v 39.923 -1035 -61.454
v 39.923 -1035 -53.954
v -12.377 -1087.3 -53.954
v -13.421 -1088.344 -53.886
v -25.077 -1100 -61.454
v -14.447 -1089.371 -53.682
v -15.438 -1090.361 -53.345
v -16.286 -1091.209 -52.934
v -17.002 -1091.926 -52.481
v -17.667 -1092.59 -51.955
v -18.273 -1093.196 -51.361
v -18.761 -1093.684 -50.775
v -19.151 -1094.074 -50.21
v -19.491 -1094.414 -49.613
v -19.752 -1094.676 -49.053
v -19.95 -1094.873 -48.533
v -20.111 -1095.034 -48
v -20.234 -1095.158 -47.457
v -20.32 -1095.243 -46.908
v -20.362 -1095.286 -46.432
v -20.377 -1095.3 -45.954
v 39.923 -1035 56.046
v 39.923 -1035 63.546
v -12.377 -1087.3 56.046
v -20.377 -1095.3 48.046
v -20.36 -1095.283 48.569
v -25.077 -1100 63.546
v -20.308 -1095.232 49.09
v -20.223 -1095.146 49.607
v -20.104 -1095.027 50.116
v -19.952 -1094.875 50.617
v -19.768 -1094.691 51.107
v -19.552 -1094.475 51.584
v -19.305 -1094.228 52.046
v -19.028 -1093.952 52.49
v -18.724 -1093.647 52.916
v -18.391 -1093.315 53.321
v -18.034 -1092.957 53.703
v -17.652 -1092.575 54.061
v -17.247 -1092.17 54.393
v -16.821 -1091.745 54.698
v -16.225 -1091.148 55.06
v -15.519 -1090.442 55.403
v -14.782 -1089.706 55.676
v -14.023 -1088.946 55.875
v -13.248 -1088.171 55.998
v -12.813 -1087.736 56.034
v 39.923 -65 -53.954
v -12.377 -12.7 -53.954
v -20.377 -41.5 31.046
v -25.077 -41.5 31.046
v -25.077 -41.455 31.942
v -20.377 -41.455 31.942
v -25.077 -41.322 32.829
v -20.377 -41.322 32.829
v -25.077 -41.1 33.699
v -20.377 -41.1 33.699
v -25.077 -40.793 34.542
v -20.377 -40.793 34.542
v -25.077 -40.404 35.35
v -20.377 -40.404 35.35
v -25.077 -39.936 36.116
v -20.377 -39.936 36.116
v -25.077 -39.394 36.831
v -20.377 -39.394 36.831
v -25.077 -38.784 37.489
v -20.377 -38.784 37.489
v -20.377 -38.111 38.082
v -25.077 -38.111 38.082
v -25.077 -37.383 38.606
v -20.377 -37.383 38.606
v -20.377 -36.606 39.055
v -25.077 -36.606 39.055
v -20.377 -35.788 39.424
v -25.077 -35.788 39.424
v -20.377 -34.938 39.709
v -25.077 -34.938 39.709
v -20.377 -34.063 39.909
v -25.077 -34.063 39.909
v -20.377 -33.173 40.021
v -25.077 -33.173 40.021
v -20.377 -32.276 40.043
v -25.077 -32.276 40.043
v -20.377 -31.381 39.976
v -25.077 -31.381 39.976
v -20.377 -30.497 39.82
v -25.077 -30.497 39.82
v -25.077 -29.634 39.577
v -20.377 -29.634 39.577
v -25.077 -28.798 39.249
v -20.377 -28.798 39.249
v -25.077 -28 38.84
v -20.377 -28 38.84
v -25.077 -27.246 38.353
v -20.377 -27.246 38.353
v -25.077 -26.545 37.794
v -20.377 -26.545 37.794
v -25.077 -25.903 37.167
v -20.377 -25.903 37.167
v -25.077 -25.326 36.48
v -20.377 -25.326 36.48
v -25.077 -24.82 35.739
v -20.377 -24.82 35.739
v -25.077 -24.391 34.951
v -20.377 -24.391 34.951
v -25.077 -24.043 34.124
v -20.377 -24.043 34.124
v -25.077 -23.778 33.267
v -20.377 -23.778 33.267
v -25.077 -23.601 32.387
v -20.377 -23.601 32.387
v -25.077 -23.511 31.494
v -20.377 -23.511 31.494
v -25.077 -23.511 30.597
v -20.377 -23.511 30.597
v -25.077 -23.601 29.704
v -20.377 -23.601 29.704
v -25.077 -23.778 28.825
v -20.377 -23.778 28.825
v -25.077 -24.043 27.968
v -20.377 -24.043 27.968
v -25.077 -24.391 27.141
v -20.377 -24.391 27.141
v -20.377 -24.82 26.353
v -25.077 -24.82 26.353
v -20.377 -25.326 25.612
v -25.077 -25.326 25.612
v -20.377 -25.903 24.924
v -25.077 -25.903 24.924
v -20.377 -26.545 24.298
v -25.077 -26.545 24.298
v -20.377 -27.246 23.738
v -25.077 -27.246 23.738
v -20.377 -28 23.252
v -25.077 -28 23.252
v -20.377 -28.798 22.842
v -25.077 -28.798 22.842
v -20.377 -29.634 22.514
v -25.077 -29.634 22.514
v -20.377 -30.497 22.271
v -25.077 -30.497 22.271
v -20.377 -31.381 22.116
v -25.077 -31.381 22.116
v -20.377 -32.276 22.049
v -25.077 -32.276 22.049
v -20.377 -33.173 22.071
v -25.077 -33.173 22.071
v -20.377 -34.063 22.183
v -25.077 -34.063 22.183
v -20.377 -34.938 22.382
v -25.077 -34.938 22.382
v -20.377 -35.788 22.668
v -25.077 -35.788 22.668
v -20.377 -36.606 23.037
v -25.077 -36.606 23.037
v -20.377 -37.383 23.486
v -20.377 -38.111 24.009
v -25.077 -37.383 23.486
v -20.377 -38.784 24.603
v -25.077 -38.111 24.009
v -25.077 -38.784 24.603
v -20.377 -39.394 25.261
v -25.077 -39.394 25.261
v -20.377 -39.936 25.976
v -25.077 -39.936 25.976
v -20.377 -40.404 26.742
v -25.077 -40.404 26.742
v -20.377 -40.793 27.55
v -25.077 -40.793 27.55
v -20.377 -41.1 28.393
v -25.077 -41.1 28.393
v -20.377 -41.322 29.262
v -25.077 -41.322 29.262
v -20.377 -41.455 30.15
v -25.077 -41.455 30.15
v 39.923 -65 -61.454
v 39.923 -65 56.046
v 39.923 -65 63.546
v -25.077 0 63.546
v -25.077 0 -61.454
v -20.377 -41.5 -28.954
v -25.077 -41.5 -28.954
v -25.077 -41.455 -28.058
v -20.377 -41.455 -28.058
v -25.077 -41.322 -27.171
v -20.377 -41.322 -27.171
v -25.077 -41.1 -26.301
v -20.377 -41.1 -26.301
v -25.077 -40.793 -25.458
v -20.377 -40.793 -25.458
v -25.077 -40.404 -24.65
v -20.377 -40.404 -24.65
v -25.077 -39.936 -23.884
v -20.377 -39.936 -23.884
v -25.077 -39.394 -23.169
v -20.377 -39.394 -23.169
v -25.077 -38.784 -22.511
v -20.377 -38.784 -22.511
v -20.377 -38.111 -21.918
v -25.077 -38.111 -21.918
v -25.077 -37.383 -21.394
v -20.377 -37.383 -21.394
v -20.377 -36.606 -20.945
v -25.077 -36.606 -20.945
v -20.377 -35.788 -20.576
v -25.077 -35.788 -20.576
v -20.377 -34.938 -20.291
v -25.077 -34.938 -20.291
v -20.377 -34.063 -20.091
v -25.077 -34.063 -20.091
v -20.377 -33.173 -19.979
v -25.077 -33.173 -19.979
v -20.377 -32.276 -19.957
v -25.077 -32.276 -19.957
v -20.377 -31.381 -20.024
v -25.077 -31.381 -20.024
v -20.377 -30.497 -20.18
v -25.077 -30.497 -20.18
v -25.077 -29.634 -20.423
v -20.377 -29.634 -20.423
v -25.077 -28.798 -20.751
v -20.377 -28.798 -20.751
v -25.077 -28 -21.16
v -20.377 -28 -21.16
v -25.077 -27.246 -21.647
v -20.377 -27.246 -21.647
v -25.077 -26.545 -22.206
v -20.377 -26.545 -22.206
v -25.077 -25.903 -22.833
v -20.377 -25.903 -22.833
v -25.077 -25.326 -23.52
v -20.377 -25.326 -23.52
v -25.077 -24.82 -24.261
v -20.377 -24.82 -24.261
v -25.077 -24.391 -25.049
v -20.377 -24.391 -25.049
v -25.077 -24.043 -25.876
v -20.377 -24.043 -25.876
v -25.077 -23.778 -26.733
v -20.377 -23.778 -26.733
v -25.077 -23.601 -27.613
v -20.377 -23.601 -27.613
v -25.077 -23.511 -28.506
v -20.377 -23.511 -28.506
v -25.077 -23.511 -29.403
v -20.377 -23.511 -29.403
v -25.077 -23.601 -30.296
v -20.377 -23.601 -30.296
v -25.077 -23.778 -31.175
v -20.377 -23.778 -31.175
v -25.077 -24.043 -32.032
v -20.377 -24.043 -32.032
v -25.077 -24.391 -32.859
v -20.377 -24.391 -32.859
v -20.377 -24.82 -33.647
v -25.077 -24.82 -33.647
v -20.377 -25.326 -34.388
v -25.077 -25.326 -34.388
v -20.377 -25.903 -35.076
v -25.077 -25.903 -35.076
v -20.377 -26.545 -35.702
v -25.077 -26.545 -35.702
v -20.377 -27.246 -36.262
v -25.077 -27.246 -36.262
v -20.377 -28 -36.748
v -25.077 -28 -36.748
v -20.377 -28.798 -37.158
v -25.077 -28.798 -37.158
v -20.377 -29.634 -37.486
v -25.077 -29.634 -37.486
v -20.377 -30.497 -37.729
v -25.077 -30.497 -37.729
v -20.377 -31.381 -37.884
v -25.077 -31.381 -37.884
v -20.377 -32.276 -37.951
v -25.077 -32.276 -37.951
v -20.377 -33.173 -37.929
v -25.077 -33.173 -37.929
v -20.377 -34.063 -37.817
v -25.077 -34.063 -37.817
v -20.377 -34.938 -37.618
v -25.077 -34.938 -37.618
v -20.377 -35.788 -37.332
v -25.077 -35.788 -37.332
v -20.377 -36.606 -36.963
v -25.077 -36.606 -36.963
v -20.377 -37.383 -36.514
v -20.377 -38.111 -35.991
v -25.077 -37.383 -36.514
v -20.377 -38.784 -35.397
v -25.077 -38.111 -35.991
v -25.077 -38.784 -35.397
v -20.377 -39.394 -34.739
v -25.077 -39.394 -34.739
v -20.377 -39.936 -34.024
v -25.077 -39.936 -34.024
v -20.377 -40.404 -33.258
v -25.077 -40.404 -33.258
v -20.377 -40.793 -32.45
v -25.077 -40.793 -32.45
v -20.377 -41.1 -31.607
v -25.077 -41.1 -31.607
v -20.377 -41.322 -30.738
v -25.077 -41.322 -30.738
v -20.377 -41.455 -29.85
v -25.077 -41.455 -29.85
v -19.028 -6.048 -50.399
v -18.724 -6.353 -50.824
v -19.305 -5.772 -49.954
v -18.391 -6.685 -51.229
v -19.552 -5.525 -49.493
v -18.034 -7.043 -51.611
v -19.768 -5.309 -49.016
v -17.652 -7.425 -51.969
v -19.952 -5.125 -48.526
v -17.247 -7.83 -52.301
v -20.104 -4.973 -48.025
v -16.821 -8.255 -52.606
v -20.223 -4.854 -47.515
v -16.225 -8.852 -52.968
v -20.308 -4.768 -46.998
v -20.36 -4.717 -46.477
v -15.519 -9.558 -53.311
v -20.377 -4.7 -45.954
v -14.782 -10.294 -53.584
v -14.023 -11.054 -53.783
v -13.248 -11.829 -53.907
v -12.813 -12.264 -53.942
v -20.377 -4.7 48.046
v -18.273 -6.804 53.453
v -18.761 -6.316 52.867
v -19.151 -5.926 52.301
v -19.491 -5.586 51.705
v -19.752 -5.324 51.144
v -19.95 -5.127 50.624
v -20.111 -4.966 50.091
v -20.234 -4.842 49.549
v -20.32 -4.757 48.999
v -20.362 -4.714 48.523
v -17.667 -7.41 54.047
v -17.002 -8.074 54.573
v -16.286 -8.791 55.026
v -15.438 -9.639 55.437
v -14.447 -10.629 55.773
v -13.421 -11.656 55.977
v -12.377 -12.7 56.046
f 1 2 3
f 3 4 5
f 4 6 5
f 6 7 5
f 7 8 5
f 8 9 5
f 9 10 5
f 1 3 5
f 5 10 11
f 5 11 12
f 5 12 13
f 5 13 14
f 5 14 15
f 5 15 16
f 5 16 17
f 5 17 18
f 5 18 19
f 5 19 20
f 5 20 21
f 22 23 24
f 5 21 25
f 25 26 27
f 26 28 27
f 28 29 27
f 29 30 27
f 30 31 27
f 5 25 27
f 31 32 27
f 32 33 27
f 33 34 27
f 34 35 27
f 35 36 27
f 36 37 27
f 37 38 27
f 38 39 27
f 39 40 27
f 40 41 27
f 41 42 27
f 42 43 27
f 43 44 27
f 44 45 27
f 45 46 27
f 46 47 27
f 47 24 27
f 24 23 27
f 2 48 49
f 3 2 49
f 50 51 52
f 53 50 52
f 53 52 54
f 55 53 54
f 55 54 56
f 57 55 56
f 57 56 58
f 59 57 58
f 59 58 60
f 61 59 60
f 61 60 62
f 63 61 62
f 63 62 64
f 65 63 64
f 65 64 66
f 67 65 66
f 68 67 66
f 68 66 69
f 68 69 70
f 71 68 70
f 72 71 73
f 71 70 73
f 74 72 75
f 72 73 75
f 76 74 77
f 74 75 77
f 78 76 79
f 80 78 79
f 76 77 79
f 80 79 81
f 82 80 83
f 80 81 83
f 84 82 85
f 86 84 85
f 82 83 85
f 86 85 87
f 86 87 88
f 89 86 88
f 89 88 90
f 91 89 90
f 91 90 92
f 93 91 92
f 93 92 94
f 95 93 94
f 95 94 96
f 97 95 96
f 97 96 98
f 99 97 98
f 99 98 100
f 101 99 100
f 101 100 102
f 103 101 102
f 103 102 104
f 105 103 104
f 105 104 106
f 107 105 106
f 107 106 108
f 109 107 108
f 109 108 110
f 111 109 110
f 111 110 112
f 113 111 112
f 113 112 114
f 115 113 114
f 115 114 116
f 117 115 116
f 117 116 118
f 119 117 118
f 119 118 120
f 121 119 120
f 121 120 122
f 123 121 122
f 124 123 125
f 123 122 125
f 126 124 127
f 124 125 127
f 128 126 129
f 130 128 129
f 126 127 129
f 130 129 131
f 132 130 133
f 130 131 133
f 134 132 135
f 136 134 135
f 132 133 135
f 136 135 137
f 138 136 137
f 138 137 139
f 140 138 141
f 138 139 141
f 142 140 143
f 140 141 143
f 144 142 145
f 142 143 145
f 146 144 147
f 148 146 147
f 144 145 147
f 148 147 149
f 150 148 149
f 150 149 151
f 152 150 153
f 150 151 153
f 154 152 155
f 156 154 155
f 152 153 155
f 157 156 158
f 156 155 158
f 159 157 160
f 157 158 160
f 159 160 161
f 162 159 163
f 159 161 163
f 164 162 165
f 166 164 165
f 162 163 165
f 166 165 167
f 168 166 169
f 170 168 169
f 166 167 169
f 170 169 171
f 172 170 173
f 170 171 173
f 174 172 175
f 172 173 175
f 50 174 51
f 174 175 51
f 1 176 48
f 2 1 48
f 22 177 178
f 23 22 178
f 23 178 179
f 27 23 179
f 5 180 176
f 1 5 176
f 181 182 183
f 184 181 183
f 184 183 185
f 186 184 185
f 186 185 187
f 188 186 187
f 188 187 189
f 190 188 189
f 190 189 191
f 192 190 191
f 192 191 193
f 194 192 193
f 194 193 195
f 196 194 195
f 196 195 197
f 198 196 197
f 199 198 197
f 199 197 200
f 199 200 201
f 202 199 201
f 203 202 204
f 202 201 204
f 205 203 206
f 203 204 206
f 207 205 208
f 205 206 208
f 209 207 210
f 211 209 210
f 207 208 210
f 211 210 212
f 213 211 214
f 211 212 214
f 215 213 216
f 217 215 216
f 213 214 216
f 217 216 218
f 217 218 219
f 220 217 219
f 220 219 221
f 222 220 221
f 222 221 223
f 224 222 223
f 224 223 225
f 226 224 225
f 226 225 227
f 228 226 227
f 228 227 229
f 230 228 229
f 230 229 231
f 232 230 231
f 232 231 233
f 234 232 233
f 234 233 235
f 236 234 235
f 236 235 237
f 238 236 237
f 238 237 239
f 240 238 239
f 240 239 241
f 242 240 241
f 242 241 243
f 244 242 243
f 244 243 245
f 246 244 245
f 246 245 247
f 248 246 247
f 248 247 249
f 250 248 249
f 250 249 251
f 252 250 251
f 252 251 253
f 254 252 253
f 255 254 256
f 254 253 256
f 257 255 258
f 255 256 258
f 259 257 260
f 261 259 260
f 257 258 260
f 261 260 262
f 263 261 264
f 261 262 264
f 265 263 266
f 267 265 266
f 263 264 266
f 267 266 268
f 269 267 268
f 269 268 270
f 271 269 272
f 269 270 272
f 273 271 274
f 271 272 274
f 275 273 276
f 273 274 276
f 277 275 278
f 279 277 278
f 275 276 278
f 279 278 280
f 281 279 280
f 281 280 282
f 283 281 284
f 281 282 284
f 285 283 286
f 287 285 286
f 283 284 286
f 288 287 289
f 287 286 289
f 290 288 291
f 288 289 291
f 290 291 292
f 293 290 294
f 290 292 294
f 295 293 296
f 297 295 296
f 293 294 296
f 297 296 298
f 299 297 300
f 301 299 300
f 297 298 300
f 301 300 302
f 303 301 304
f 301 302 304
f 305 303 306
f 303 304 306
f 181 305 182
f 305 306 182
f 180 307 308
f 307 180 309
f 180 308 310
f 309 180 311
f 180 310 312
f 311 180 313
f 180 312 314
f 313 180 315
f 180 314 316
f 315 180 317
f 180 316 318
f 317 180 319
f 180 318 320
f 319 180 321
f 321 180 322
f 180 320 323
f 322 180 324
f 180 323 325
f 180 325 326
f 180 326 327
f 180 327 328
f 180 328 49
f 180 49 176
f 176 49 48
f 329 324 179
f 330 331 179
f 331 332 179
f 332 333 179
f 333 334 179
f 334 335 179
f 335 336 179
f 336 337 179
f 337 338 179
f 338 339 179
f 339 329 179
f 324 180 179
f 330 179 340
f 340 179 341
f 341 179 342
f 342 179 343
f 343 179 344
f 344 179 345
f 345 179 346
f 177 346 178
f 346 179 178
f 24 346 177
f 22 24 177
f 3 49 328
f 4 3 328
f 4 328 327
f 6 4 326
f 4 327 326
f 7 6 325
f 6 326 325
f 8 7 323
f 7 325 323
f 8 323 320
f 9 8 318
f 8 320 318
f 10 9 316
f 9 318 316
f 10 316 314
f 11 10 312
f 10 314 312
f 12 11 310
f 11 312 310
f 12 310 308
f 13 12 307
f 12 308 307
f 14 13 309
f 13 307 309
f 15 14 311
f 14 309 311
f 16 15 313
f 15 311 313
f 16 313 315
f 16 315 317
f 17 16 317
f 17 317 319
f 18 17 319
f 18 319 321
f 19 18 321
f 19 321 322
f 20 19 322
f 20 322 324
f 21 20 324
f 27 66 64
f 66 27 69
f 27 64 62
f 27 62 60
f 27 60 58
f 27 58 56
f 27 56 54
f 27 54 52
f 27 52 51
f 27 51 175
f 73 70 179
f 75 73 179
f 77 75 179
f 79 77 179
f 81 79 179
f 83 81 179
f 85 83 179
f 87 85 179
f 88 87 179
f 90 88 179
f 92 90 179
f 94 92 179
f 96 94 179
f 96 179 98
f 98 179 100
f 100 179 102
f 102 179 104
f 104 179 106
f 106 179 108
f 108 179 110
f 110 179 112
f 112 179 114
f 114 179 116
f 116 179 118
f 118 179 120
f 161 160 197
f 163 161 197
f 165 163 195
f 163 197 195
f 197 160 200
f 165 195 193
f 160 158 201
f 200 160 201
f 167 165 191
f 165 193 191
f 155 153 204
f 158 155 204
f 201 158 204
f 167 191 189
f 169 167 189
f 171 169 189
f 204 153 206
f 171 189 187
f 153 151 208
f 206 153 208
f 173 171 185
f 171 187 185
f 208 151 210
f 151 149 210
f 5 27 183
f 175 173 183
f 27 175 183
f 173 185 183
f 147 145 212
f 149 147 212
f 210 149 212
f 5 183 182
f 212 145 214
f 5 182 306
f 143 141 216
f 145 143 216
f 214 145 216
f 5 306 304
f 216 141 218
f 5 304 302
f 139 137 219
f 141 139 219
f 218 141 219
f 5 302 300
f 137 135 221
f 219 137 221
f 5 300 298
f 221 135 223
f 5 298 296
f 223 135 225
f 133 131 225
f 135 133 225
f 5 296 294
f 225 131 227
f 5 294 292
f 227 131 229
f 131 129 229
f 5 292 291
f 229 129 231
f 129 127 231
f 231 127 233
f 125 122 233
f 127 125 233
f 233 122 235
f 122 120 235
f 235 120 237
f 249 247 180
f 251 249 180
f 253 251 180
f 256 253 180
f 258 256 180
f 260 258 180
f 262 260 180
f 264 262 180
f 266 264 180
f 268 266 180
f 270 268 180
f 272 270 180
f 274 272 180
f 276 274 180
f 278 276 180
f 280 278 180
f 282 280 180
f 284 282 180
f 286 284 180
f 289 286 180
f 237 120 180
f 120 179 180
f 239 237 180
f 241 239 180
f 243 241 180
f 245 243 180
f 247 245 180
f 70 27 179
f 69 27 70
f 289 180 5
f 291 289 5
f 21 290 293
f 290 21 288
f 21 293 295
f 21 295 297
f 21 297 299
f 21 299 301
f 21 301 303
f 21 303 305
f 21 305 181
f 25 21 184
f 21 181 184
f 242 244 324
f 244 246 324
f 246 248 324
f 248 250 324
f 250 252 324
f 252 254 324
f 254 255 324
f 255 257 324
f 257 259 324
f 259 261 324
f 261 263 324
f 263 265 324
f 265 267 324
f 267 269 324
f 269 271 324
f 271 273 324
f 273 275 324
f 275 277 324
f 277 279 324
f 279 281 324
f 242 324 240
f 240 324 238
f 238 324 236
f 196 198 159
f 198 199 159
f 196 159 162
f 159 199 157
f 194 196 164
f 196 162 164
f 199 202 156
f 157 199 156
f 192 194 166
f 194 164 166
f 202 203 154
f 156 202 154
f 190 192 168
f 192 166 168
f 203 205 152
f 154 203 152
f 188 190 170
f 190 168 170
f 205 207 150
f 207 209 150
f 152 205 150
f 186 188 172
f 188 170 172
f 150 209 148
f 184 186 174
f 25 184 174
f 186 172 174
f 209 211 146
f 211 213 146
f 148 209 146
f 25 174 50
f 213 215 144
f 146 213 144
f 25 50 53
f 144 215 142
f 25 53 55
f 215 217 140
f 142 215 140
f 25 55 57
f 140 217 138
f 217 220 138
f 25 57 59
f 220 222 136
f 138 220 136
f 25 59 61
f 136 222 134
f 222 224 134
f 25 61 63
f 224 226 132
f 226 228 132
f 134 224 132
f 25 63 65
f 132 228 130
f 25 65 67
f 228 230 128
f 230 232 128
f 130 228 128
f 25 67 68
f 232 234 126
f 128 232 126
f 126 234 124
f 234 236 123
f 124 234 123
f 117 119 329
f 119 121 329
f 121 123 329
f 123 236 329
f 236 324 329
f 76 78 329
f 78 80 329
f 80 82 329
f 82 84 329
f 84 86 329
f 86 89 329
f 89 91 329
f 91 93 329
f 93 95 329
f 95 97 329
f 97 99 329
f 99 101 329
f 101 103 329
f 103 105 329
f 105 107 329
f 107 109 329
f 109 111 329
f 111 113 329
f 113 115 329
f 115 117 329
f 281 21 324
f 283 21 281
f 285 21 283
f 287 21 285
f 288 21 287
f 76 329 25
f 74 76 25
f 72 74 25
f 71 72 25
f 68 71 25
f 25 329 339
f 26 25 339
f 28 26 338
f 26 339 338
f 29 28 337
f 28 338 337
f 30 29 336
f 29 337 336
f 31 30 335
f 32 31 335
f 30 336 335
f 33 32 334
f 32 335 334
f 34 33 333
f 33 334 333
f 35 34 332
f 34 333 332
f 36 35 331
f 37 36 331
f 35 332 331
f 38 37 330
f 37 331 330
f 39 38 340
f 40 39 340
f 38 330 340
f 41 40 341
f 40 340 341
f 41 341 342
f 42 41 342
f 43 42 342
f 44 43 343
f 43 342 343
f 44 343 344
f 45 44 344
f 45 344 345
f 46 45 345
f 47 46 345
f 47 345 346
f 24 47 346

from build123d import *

# Parameters (mm, degrees)
F1_DEPTH = 1100
F3_DEPTH = 125.001
F4_R     = 9
F5_DEPTH = 65.001


with BuildPart() as f1:
    # F0 (on Front) → F1 (new body)
    with BuildSketch(Plane.XZ):
        with BuildLine():
            Line((-25.076735, 63.545803), (-25.076735, -61.454197))
            Line((-25.076735, -61.454197), (39.923265, -61.454197))
            Line((39.923265, -61.454197), (39.923265, -53.954197))
            Line((39.923265, -53.954197), (-12.376735, -53.954197))
            ThreePointArc((-12.376735, -53.954197), (-18.033589, -51.611052), (-20.376735, -45.954197))
            Line((-20.376735, -45.954197), (-20.376735, 48.045803))
            ThreePointArc((-20.376735, 48.045803), (-18.033589, 53.702657), (-12.376735, 56.045803))
            Line((-12.376735, 56.045803), (39.923265, 56.045803))
            Line((39.923265, 56.045803), (39.923265, 63.545803))
            Line((39.923265, 63.545803), (-25.076735, 63.545803))
        make_face()
    extrude(amount=F1_DEPTH)

    # F2 (on face) → F3 (cut, through all)
    with BuildSketch(Plane.XY.offset(63.545803)):
        Polygon((-25.076735, 0), (39.923265, -65), (39.923265, 0), align=None)
        Polygon((-25.076735, -1100), (39.923265, -1100), (39.923265, -1035), align=None)
    extrude(amount=-F3_DEPTH, mode=Mode.SUBTRACT)

    # F4 (on face) → F5 (cut, through all)
    with BuildSketch(Plane(origin=(-25.076735, 0, 0), x_dir=(0, -1, 0), z_dir=(-1, 0, 0))):
        with Locations((32.5, 31.045803)):
            Circle(F4_R)
        with Locations((32.5, -28.954197)):
            Circle(F4_R)
    extrude(amount=-F5_DEPTH, mode=Mode.SUBTRACT)


solid = f1.part
